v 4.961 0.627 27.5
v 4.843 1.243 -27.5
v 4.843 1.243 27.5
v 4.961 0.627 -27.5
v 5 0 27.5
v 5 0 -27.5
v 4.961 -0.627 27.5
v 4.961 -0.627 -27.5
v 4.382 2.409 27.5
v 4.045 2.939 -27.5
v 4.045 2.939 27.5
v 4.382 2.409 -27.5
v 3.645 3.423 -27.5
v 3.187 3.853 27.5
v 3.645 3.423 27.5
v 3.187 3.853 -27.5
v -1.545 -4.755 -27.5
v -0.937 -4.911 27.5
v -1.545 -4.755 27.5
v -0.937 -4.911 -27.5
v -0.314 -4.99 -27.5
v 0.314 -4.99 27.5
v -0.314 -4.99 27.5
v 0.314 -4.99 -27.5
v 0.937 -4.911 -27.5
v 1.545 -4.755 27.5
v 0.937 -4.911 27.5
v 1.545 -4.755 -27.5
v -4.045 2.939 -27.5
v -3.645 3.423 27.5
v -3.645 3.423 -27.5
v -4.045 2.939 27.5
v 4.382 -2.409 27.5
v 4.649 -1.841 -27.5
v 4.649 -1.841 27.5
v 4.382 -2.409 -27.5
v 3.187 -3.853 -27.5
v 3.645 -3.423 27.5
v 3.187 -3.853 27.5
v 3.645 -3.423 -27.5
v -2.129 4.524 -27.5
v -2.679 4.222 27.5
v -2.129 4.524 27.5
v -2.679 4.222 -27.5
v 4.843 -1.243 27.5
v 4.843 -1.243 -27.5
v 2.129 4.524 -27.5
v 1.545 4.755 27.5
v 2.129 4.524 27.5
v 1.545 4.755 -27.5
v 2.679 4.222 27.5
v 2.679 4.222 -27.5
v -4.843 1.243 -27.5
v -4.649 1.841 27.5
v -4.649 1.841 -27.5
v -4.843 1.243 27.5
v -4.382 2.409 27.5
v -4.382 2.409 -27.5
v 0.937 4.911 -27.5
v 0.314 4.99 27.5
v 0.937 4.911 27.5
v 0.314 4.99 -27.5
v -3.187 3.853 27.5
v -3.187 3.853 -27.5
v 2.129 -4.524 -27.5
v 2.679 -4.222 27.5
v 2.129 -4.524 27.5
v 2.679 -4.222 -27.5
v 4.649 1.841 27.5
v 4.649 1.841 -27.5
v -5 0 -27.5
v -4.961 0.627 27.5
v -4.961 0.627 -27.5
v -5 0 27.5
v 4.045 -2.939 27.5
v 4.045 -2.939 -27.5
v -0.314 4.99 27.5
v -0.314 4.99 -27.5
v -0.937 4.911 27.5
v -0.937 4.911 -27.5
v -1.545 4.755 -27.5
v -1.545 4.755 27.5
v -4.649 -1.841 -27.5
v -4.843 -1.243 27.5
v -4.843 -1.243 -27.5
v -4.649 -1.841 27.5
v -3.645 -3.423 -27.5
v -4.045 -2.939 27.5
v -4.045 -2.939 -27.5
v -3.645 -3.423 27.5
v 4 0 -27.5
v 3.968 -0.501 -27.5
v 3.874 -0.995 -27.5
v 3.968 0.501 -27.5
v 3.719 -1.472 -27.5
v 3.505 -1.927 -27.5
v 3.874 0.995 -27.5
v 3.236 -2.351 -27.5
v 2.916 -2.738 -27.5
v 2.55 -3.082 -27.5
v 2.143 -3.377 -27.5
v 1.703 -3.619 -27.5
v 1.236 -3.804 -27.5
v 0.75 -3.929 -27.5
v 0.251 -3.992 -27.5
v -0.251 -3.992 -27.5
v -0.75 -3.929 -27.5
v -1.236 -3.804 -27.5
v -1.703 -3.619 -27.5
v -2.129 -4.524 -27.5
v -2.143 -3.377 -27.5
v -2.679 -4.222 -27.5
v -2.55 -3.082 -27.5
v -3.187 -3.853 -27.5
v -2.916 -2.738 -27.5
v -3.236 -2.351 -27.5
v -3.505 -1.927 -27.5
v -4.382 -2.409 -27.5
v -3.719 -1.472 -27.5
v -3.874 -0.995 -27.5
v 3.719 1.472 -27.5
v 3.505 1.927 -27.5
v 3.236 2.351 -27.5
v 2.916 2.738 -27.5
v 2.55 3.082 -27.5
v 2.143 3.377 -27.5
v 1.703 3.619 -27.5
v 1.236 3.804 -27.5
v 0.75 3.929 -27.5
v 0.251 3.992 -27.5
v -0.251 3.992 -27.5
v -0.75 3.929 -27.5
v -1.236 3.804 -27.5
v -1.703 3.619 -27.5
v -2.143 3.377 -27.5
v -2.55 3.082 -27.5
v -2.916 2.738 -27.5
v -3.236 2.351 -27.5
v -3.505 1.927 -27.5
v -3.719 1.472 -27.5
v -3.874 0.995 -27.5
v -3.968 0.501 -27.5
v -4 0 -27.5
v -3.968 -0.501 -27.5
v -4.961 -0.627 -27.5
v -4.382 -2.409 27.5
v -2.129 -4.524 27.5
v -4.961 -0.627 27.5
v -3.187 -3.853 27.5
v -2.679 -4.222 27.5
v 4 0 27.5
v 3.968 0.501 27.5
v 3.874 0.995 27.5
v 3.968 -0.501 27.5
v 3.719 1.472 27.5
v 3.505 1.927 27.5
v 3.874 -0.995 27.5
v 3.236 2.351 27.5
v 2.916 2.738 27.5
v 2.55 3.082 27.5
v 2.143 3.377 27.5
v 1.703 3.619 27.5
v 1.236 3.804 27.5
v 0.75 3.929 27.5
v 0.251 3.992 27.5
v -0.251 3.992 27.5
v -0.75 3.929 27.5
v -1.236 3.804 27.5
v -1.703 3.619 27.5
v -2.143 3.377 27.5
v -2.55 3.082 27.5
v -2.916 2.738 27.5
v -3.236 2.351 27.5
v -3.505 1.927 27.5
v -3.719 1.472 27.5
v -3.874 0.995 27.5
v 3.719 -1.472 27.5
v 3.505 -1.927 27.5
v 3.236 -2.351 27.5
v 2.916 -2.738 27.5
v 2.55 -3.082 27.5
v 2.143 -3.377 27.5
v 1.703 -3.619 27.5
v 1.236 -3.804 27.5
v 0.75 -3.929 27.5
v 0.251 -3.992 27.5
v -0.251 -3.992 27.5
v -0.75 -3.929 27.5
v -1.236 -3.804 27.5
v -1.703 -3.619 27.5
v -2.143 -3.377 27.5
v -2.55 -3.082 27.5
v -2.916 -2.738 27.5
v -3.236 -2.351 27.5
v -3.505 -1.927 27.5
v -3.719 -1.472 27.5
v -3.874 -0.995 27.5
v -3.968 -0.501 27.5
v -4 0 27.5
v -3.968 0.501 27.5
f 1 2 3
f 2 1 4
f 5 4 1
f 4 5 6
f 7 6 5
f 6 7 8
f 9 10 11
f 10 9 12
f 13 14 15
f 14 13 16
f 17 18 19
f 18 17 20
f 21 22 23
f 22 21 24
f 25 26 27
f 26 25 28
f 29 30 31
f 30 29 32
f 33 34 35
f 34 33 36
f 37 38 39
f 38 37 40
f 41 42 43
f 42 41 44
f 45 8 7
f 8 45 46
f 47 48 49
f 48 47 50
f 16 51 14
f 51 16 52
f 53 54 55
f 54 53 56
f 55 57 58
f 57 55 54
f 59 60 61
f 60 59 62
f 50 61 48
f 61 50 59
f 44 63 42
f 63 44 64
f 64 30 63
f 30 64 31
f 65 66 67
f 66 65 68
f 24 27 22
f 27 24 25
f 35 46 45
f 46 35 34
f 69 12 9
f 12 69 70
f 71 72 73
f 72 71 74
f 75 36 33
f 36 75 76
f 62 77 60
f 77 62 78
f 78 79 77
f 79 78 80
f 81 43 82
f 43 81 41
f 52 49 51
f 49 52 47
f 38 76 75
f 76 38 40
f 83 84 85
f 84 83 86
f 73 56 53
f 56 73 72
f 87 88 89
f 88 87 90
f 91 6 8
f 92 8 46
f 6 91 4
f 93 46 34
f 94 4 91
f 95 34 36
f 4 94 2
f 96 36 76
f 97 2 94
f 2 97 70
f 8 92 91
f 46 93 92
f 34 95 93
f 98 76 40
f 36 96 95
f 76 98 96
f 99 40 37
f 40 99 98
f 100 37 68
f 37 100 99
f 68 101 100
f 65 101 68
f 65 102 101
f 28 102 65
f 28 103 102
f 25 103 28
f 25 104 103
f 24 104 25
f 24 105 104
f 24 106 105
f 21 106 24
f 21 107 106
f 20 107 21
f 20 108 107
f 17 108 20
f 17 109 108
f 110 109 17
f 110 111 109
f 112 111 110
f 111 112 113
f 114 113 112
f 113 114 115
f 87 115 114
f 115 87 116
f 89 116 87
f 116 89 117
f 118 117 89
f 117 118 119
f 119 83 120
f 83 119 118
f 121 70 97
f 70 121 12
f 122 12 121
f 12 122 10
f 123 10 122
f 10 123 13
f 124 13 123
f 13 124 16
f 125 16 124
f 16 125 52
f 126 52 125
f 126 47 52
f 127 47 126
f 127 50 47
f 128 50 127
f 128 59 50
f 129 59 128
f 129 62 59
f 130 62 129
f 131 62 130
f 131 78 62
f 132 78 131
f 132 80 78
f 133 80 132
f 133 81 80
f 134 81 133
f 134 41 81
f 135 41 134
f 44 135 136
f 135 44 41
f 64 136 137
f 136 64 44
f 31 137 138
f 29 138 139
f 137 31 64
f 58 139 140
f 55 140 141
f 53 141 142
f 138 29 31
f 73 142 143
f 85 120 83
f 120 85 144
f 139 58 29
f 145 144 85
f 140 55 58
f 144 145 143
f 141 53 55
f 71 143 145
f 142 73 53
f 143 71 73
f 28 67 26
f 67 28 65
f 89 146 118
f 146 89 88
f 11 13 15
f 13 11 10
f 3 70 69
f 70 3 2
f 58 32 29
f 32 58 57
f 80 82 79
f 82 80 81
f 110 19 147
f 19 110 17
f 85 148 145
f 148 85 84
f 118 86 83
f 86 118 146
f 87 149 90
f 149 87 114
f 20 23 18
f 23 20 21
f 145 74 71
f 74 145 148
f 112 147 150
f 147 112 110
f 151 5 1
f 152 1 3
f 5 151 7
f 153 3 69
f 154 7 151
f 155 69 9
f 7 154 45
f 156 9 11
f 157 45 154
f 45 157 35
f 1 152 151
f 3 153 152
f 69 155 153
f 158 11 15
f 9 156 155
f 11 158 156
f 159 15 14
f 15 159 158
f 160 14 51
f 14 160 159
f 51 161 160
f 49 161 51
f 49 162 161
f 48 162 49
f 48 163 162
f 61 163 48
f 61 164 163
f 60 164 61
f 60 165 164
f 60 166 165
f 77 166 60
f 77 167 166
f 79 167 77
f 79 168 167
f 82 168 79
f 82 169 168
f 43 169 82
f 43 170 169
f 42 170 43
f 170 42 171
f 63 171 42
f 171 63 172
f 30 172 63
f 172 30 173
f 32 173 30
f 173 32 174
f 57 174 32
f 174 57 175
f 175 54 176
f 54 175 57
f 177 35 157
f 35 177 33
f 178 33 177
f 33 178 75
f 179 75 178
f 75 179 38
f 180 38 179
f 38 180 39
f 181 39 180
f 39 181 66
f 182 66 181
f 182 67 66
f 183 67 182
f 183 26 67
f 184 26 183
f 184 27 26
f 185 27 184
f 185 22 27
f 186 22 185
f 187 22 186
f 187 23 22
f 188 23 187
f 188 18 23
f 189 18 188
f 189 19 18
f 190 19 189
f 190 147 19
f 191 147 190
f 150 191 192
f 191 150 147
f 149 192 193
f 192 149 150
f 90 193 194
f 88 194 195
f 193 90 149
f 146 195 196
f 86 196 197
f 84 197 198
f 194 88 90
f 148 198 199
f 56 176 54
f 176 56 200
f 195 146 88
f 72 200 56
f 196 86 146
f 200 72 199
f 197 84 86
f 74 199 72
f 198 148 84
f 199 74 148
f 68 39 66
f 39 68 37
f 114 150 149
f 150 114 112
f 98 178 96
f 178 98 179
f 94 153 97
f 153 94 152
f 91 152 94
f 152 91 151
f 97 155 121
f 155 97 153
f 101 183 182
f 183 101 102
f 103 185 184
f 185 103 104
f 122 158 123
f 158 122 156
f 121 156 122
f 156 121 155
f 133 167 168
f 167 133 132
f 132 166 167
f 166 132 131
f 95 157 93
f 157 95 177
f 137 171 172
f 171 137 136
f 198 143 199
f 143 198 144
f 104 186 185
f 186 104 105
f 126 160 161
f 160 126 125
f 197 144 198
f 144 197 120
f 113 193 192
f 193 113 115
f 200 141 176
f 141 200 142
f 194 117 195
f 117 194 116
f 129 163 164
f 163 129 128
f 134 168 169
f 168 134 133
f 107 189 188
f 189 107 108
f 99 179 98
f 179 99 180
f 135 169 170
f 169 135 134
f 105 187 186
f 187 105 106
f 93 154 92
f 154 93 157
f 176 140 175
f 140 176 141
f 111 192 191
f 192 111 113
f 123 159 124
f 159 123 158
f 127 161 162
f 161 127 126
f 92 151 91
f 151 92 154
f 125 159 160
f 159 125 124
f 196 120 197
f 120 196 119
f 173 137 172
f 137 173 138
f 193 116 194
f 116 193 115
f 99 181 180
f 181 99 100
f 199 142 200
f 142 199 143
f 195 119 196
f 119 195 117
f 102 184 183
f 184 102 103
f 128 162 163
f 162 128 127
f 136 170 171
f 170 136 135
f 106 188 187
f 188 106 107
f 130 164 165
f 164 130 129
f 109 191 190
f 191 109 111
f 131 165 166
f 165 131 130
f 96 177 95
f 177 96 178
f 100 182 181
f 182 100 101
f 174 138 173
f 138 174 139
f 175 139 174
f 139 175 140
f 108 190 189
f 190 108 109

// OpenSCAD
$fn = 50;


difference() {
	union() {
		translate(v = [0, 0, -27.5000000000]) {
			cylinder(h = 55, r = 5.0000000000);
		}
	}
	union() {
		translate(v = [0, 0, -100.0000000000]) {
			cylinder(h = 200, r = 4.0000000000);
		}
	}
}
